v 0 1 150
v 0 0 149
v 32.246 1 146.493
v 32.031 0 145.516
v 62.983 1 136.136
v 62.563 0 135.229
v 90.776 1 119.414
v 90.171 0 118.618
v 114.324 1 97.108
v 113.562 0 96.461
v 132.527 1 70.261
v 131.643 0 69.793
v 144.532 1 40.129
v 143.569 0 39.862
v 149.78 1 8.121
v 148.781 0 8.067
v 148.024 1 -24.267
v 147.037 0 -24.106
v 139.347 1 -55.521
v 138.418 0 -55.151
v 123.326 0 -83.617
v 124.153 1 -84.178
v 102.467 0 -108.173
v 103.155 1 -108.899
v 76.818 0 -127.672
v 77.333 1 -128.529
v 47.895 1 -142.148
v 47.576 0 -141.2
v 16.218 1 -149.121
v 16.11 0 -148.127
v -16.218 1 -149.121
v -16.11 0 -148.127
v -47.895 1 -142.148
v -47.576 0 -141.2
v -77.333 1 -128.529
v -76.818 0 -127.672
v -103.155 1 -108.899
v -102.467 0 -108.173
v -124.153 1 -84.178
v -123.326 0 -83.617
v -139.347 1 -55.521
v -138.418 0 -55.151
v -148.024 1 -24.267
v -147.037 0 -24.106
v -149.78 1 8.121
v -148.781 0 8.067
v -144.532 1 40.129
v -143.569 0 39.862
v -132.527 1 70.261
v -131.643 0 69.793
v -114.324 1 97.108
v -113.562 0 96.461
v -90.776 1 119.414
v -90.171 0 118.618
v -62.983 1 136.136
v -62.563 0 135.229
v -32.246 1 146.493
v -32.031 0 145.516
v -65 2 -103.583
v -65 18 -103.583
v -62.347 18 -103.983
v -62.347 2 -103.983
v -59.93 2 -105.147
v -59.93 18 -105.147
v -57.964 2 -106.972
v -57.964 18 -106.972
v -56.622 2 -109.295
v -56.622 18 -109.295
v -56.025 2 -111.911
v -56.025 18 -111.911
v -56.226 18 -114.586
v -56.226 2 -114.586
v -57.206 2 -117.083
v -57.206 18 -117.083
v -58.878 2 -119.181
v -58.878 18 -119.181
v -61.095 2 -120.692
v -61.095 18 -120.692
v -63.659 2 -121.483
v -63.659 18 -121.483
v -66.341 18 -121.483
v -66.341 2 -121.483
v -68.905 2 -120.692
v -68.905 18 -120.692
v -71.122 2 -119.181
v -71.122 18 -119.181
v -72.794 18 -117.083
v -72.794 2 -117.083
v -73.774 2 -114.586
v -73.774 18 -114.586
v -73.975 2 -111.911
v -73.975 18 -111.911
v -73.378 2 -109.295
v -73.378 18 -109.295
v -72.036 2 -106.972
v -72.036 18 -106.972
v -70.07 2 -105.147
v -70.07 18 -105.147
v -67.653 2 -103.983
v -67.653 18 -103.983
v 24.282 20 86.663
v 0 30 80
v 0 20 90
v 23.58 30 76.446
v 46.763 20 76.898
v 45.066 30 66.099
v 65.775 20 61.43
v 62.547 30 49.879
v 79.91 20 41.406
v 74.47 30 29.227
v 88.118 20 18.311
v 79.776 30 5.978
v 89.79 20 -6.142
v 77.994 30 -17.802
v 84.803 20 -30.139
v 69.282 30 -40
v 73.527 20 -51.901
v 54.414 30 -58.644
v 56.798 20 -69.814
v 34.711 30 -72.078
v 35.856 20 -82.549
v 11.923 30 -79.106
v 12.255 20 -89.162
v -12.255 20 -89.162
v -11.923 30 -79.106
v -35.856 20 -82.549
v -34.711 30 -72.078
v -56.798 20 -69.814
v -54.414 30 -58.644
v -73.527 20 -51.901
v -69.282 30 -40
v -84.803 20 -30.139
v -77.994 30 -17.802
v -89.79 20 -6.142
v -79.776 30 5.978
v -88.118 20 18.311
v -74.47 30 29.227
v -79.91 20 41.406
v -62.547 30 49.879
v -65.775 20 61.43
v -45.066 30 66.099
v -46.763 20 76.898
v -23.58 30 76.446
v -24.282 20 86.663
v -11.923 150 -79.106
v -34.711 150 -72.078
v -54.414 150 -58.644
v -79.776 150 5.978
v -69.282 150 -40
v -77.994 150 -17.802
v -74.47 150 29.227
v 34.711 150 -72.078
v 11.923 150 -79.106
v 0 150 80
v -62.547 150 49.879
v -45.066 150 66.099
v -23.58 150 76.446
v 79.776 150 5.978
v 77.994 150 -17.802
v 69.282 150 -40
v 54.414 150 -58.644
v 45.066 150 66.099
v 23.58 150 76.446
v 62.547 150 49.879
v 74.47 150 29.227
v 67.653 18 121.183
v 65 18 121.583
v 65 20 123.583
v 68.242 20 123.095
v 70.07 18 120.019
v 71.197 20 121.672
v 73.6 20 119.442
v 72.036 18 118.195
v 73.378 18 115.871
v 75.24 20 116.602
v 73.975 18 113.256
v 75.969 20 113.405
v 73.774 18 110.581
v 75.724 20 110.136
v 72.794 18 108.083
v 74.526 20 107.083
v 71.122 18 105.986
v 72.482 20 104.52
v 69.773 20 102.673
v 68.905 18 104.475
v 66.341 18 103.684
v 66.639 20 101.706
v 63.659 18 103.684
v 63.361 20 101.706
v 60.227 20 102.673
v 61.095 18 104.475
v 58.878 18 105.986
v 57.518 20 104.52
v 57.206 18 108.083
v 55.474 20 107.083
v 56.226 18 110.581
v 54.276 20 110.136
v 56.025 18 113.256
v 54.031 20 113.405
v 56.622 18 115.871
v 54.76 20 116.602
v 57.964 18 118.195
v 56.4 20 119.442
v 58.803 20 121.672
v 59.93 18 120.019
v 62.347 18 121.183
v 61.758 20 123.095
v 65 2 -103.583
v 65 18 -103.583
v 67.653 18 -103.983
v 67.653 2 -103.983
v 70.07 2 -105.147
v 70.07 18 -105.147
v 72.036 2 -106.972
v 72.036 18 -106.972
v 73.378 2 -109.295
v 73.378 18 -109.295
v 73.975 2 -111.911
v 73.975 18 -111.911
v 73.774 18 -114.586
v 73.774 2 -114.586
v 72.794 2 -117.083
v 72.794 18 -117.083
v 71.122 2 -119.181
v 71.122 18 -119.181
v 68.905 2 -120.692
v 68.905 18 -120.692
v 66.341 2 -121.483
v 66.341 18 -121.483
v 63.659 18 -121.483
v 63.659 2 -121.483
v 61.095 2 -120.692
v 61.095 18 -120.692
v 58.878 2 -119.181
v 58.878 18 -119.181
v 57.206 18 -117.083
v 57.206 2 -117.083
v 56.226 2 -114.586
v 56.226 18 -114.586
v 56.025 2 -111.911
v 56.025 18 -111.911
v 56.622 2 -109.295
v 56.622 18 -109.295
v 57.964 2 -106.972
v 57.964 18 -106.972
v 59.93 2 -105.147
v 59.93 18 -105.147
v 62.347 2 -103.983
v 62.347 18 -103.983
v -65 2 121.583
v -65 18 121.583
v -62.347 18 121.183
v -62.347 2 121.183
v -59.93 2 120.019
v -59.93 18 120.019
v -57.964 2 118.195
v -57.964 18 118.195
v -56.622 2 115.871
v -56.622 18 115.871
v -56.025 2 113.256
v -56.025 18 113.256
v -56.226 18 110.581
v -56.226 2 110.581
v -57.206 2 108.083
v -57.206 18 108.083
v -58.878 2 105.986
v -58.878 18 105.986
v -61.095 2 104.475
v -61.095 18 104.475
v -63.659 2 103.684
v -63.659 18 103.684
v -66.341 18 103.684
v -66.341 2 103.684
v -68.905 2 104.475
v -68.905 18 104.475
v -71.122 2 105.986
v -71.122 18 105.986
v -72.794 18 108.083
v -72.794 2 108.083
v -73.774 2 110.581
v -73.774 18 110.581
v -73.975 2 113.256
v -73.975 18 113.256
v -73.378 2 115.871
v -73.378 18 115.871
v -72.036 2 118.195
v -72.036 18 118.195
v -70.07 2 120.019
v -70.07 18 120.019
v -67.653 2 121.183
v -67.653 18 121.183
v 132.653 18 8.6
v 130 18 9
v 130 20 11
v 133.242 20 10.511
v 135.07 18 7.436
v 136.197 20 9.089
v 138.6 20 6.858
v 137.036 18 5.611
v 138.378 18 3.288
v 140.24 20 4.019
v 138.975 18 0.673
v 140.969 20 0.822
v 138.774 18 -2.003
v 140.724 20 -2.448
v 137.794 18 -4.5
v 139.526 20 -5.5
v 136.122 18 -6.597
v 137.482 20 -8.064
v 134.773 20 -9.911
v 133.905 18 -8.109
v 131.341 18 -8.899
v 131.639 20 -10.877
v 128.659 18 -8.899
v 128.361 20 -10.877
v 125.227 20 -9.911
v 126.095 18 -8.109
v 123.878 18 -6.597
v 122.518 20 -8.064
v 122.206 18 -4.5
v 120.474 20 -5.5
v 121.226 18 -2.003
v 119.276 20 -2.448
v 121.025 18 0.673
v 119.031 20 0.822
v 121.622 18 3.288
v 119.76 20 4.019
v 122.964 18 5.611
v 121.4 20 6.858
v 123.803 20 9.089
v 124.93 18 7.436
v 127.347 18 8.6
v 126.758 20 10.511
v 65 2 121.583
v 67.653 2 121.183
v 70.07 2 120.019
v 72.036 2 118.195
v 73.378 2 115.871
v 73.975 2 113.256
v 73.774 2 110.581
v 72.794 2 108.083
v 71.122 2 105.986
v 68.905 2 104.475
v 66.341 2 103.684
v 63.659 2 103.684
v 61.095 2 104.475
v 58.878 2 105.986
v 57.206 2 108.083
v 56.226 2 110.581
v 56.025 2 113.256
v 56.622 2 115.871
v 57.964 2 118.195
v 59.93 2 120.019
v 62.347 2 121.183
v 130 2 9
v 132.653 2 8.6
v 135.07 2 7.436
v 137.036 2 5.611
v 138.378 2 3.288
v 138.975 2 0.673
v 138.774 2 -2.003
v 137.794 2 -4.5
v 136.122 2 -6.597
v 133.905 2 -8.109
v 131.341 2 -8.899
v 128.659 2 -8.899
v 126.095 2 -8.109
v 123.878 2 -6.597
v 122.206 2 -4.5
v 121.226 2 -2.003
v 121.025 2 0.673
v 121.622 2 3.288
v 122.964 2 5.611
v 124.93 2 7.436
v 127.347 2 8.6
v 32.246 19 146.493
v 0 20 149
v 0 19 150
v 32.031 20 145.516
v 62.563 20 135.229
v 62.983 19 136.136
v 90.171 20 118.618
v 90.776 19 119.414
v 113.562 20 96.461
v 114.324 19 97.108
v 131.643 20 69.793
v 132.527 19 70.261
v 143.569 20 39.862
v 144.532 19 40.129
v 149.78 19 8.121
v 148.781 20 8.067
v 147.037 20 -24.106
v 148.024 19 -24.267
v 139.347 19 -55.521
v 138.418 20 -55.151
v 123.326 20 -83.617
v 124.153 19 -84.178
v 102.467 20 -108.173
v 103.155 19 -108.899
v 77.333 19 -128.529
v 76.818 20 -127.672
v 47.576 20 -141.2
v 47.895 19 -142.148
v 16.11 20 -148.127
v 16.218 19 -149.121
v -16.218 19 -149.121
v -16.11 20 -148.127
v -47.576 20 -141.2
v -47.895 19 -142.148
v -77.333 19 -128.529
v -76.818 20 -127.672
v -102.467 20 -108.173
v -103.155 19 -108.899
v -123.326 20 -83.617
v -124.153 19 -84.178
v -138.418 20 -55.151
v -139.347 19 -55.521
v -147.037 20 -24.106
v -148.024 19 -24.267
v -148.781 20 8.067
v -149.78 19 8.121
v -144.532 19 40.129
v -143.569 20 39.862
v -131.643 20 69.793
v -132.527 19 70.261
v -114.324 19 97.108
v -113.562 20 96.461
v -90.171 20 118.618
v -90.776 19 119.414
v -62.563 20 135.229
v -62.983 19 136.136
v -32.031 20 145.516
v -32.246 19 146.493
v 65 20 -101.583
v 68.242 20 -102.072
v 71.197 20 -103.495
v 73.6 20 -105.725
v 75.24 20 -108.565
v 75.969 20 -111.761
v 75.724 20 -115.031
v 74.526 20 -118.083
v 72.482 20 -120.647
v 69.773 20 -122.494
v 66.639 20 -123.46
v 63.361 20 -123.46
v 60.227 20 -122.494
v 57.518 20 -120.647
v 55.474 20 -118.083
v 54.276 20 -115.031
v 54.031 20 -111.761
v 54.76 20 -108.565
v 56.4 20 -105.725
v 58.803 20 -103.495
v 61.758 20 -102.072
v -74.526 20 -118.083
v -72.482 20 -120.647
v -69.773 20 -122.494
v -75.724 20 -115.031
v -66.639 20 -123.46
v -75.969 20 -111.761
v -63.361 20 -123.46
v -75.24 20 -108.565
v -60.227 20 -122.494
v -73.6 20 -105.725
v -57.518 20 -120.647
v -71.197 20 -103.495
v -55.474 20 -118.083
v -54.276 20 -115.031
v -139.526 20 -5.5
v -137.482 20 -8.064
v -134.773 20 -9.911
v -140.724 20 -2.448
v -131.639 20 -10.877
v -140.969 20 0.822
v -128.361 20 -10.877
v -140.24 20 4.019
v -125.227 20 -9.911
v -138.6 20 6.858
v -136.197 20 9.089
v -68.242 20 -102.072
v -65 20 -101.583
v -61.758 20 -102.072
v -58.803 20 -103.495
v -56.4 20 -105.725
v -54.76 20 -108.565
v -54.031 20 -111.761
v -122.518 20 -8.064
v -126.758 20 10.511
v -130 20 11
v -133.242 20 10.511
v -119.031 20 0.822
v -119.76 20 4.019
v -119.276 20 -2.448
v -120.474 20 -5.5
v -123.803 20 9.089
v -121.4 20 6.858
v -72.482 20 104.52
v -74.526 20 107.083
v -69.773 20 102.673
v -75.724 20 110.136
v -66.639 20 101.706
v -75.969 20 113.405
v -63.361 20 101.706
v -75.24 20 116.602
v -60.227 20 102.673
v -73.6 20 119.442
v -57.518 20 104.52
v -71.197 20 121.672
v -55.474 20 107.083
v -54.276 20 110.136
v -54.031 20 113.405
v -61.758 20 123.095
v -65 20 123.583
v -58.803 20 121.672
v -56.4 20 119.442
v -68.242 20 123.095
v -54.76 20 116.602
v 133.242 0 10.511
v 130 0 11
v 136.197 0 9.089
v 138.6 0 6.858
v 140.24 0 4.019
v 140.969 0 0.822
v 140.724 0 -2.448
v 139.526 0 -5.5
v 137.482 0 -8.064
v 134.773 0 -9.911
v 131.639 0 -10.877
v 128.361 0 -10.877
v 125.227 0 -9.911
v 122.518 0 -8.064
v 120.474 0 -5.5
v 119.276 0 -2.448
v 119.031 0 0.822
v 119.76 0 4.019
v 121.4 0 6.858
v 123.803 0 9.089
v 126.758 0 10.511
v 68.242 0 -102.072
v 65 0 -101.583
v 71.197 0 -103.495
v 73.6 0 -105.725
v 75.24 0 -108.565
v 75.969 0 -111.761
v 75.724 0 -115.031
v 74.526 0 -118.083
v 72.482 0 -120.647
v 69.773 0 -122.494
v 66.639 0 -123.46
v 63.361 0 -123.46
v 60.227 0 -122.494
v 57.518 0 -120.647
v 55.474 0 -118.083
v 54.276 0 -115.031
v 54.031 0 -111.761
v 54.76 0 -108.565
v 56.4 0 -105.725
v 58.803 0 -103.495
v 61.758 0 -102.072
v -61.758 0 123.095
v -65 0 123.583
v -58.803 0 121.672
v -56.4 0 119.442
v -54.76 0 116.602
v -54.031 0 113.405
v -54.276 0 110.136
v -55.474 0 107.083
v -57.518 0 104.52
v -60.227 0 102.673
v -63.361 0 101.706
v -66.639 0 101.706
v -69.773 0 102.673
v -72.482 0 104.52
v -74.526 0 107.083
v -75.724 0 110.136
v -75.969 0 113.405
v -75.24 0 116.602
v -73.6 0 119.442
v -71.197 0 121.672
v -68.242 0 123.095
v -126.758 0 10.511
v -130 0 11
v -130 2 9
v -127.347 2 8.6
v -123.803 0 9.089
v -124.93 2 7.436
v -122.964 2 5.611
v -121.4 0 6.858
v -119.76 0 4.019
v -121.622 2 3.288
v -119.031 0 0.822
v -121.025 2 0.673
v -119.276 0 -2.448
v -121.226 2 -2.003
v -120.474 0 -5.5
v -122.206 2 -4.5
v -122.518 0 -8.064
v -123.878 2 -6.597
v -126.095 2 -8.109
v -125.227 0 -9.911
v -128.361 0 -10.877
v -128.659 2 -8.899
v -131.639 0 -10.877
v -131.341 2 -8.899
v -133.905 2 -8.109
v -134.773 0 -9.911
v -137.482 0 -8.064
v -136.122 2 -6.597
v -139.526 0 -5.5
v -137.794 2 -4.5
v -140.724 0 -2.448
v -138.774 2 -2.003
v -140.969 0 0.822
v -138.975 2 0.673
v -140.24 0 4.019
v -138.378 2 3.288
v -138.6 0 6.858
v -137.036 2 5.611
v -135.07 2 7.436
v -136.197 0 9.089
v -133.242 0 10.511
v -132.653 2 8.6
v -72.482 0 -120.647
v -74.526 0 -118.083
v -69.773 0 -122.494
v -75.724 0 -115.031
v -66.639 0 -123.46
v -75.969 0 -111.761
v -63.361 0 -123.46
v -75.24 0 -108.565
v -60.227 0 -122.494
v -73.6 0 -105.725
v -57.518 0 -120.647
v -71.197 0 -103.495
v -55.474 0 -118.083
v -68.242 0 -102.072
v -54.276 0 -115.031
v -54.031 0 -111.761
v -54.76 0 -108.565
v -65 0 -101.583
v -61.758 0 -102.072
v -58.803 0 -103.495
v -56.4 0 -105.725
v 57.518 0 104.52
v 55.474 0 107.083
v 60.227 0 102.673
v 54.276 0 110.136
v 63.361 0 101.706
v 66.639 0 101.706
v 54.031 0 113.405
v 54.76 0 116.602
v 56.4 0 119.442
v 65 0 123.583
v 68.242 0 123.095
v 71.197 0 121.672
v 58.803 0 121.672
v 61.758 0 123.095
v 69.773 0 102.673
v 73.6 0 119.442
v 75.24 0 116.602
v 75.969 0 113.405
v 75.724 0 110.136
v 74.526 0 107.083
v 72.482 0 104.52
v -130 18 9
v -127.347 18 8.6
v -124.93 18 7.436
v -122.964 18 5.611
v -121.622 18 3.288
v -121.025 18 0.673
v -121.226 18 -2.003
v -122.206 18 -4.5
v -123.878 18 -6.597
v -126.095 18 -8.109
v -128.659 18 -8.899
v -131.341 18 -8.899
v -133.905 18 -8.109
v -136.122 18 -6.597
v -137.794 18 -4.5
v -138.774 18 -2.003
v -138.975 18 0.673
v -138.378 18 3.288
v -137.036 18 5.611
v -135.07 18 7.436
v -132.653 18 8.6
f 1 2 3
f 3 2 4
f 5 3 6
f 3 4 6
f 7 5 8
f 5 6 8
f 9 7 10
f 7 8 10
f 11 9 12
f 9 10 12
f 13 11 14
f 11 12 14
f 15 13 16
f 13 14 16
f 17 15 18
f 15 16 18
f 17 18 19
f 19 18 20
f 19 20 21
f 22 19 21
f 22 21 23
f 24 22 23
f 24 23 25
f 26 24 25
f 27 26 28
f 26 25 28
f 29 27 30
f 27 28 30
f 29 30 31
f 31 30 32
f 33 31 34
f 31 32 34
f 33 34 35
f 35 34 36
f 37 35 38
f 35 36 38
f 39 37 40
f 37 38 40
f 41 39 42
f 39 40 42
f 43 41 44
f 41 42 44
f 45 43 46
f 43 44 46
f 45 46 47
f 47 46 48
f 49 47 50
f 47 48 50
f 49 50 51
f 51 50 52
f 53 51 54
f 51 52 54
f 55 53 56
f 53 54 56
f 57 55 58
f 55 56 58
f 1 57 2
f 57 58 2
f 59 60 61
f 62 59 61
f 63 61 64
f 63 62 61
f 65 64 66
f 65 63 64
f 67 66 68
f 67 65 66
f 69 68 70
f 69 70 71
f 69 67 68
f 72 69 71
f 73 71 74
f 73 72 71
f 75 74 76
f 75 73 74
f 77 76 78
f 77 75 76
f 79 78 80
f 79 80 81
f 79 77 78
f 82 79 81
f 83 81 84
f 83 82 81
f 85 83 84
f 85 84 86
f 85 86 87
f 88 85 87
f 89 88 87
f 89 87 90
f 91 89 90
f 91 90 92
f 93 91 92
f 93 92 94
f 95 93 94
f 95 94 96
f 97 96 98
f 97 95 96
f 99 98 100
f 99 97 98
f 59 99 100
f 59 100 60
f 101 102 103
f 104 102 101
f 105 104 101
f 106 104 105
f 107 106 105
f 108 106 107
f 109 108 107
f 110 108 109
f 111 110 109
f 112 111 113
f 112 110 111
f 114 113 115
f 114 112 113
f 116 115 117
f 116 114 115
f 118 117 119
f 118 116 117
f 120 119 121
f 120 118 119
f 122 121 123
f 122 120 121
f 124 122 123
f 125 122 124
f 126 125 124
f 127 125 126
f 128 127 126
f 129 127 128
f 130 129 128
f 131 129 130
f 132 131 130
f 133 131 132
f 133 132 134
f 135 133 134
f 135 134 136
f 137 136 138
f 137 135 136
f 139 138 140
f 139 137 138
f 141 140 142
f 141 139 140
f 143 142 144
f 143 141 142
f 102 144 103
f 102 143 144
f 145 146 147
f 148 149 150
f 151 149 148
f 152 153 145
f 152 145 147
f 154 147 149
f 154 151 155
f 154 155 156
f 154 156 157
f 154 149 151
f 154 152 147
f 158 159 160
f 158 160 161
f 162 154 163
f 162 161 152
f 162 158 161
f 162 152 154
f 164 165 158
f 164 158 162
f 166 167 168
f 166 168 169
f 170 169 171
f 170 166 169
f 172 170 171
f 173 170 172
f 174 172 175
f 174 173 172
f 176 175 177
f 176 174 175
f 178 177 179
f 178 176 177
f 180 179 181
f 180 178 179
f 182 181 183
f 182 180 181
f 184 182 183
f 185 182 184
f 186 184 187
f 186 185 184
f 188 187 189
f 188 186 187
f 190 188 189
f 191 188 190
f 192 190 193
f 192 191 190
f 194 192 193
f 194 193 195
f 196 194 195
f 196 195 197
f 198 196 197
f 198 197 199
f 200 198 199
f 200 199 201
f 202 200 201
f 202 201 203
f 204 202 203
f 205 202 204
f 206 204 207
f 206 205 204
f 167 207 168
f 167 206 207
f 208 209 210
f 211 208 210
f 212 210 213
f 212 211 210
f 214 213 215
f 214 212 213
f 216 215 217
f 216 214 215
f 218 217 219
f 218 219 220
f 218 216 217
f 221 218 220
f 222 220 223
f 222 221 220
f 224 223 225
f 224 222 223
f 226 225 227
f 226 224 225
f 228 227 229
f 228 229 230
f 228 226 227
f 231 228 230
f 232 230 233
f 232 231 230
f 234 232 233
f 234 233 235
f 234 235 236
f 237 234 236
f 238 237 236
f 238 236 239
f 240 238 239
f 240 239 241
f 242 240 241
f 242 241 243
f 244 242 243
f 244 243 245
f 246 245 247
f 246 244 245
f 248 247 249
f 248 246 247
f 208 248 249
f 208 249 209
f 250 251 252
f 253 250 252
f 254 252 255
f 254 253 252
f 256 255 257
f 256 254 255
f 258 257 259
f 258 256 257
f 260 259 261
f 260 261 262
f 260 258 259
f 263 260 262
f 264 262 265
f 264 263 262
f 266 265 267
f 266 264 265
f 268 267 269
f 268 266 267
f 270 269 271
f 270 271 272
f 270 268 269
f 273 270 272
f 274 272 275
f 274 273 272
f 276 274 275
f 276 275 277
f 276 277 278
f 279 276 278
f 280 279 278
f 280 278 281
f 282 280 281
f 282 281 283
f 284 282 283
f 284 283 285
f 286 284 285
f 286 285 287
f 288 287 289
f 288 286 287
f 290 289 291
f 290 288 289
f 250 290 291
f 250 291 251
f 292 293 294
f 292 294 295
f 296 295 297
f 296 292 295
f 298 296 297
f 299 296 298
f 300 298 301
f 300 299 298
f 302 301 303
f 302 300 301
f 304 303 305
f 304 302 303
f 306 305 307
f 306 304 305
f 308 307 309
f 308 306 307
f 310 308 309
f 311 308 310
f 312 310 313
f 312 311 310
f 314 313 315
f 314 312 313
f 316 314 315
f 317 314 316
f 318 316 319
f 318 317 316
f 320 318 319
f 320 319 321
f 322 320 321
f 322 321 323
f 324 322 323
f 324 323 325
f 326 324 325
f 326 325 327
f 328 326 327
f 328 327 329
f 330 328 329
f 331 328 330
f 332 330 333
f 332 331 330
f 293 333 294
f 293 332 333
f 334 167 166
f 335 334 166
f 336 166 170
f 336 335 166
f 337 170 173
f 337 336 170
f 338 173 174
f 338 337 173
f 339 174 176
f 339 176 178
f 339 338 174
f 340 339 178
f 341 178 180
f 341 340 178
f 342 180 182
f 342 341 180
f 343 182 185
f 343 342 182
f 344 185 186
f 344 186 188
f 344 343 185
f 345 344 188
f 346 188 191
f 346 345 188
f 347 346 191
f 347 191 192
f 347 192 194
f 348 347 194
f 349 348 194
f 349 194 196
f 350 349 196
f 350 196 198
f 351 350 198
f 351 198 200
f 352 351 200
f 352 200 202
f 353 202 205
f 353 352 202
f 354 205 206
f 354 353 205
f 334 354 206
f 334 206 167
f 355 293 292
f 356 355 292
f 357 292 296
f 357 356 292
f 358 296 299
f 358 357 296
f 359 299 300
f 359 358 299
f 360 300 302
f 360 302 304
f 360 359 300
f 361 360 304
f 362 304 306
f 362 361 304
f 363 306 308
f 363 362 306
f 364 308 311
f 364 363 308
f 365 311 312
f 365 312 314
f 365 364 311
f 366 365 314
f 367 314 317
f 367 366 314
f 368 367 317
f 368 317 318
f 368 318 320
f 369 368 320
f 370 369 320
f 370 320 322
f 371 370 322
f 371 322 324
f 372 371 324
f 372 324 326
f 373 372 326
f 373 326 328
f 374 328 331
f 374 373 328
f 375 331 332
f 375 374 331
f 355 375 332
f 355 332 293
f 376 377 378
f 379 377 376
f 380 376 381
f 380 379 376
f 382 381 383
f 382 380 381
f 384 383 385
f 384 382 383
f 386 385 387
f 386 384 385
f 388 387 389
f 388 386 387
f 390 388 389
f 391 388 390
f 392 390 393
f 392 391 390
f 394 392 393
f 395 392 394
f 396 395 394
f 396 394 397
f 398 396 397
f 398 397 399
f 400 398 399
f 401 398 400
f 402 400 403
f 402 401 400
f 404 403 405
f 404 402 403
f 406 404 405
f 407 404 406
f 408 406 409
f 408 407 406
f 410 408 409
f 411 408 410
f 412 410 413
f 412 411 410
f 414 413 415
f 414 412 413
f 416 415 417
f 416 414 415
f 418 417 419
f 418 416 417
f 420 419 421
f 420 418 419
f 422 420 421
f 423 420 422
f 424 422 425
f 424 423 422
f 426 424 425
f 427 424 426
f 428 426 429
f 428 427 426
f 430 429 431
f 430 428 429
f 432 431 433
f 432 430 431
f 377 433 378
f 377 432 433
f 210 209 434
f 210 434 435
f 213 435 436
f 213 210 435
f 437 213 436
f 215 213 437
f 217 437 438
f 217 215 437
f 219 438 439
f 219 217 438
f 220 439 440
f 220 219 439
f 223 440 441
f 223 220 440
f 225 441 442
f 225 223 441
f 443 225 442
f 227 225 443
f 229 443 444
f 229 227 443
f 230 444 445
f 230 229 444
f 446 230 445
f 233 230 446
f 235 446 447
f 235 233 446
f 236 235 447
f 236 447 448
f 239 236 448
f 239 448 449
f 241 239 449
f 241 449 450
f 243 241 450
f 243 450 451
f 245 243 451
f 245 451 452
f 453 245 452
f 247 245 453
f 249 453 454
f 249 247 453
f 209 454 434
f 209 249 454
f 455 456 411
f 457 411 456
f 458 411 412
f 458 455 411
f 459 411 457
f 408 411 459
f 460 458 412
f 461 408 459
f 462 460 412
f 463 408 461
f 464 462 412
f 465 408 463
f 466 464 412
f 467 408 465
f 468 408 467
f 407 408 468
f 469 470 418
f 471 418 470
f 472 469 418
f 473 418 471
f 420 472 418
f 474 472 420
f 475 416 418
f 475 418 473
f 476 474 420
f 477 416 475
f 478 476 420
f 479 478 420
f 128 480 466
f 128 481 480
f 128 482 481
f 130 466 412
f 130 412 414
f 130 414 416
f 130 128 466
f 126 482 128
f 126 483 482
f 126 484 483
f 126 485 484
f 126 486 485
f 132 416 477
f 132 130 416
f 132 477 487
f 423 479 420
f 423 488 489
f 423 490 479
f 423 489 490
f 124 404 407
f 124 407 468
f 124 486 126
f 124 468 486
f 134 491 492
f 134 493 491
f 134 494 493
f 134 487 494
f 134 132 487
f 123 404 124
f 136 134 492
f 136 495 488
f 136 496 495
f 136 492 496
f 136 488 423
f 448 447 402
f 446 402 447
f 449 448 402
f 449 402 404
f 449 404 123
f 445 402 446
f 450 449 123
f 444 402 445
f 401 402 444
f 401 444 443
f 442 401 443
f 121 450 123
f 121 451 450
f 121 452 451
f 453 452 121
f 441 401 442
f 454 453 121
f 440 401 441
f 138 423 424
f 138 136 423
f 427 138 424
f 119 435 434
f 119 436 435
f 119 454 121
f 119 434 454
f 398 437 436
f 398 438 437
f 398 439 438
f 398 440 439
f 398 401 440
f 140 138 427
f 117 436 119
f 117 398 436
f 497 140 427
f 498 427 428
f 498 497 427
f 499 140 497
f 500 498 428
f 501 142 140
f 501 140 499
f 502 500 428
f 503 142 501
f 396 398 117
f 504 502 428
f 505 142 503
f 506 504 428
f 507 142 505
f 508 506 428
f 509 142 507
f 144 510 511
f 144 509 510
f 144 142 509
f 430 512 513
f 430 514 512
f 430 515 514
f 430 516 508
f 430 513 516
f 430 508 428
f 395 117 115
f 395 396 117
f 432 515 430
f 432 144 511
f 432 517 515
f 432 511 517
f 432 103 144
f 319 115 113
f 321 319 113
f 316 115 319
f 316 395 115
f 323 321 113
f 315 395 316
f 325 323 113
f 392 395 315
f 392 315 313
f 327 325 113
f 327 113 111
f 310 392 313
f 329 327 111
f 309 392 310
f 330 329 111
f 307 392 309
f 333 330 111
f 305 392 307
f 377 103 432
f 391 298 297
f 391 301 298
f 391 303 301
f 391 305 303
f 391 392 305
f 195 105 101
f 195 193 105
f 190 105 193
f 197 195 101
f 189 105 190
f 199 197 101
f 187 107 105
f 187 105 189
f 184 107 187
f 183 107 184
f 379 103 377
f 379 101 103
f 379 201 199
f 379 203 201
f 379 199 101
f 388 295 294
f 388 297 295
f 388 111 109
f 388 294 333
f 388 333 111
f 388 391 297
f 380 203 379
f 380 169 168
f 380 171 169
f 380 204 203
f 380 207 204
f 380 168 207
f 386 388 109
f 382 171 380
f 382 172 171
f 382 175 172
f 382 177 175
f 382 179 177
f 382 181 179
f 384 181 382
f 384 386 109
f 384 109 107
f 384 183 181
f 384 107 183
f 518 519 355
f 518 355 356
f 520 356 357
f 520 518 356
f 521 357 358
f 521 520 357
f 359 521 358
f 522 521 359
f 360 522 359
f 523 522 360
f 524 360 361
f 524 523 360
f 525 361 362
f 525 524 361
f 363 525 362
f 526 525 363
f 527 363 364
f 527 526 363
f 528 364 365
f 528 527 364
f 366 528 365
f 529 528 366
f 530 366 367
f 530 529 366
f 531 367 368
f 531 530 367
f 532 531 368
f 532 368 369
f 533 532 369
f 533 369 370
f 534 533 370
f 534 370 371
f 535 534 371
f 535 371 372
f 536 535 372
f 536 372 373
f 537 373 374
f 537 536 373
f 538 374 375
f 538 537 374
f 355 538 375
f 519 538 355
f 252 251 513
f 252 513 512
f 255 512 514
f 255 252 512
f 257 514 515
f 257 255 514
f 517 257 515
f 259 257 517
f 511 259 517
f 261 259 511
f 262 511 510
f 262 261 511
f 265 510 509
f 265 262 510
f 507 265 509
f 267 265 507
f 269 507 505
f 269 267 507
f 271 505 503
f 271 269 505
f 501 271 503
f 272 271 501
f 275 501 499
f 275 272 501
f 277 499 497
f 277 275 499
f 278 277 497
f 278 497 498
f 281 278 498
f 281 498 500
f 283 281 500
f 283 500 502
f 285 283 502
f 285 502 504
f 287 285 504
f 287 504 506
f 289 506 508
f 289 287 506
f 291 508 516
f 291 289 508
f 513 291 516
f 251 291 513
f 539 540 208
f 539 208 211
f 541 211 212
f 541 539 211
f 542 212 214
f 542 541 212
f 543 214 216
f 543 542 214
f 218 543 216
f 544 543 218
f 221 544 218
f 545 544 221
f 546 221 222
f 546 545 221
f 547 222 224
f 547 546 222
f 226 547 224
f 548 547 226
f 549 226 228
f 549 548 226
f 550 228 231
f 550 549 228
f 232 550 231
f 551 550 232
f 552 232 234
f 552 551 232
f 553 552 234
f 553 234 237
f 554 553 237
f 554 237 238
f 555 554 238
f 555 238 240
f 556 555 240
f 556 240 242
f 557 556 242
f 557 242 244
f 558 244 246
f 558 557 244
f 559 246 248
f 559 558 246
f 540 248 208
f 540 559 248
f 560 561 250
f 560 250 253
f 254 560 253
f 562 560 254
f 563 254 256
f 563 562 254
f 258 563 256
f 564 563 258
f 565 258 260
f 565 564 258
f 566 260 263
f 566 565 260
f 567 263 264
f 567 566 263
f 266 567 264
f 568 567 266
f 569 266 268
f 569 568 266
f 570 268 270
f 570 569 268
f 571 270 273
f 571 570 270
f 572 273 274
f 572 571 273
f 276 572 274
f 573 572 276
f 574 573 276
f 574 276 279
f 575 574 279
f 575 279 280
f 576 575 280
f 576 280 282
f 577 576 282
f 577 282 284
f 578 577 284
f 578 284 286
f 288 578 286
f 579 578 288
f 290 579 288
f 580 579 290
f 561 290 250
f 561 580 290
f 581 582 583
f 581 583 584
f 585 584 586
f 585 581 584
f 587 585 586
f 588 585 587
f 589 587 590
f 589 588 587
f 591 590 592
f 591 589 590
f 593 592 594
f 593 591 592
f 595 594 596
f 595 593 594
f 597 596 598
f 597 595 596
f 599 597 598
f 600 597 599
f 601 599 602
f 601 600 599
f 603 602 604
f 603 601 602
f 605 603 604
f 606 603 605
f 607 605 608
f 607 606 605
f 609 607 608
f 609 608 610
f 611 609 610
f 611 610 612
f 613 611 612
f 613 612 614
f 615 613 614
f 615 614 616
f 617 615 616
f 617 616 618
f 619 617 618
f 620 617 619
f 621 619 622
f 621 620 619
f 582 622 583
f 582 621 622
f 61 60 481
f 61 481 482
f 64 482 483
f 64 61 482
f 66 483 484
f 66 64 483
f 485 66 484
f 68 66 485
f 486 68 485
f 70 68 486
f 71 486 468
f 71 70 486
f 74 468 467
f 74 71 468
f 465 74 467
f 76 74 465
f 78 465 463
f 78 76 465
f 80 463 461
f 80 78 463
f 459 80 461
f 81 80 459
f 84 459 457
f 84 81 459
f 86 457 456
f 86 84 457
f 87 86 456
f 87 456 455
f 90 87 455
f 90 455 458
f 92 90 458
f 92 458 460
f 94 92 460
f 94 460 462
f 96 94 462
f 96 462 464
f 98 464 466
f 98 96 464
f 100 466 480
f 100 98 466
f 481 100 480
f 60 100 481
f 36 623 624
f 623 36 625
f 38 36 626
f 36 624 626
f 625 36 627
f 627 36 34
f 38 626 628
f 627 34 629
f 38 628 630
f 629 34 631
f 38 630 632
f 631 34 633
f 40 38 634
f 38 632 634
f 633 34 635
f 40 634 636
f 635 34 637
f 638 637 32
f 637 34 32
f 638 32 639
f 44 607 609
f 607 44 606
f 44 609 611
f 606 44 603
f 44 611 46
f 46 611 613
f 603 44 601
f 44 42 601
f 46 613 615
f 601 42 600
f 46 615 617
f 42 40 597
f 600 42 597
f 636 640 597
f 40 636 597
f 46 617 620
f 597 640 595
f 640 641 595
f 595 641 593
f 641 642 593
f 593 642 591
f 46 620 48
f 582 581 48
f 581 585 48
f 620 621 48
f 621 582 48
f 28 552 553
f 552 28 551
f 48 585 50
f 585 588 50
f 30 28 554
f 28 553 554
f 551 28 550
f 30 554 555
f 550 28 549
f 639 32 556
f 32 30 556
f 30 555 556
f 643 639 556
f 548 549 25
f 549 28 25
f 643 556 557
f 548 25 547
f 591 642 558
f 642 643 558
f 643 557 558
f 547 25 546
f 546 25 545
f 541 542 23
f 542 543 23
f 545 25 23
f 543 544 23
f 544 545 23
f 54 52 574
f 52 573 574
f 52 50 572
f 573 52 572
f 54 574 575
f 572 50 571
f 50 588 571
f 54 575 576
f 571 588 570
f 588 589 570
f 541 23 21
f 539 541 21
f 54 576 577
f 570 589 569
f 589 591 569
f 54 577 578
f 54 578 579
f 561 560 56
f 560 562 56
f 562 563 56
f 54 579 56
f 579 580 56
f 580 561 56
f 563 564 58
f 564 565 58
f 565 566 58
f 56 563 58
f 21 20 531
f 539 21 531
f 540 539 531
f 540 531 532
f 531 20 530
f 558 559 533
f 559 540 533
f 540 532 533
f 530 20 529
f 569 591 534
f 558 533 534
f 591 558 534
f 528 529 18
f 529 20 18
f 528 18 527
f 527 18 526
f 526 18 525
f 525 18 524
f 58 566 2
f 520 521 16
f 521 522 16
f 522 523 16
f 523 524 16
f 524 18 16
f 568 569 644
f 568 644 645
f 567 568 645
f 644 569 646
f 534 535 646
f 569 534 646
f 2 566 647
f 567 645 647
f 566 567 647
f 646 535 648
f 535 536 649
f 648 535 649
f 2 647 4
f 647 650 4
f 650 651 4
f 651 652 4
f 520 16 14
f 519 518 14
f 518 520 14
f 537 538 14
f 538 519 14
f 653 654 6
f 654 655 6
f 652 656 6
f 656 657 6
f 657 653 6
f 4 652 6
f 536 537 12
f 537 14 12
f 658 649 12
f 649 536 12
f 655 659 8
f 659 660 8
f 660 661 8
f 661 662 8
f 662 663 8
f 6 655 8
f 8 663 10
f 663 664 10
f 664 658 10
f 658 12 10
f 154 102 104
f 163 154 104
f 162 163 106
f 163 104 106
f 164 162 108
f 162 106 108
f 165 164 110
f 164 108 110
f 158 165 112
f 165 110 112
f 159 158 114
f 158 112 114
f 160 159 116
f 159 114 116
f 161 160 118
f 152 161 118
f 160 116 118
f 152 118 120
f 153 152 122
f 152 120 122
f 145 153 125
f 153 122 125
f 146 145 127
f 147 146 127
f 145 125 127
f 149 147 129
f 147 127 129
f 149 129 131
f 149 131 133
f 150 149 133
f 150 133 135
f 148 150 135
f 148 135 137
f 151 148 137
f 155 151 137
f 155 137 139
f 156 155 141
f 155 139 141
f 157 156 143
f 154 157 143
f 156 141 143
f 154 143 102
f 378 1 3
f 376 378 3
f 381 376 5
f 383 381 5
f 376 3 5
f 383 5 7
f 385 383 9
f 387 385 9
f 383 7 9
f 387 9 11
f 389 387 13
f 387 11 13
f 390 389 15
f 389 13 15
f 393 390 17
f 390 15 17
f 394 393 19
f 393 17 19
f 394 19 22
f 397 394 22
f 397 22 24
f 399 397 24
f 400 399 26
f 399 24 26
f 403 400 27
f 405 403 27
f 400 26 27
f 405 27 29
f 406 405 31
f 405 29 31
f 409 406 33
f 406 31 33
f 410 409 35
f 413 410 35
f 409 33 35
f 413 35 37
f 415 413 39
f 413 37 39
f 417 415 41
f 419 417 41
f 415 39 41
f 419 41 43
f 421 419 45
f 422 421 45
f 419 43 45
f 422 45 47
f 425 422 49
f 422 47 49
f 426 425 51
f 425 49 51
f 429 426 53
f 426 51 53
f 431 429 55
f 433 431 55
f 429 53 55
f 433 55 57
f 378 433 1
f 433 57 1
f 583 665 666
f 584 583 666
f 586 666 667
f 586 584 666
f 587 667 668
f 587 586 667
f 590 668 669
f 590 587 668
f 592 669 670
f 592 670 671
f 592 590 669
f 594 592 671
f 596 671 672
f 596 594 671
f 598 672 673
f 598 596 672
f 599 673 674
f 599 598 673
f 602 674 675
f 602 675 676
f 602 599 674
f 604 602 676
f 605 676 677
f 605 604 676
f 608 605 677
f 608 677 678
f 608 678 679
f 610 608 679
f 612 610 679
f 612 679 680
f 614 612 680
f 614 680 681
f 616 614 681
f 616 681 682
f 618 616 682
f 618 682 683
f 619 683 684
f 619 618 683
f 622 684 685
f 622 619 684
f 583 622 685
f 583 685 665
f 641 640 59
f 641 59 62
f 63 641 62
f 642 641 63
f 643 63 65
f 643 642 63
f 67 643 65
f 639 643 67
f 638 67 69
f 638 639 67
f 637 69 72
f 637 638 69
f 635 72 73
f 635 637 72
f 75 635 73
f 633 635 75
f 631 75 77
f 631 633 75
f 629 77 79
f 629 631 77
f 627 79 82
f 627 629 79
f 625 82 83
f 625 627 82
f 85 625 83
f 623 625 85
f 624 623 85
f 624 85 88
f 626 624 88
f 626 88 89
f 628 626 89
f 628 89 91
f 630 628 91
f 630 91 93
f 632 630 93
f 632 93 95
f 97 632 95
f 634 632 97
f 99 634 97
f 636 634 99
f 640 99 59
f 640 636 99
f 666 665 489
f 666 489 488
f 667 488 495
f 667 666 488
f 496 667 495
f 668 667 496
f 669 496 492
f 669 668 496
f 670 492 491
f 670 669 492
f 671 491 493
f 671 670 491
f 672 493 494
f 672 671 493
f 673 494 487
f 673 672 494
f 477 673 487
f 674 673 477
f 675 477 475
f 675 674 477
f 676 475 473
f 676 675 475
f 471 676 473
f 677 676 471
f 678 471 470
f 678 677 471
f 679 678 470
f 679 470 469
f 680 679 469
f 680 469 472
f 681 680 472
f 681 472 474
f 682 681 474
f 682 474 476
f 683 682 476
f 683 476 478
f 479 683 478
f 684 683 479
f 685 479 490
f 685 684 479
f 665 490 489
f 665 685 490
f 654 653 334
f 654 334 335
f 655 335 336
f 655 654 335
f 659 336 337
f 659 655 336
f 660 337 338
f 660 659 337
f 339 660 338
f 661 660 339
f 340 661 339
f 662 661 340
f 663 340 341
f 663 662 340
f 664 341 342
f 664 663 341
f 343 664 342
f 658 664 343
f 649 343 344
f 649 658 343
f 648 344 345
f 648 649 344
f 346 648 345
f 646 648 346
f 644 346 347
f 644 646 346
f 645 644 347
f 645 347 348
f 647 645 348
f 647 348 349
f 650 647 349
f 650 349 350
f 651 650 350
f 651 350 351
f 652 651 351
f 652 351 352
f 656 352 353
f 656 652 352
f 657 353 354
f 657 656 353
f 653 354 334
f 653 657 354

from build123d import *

# Parameters (mm, degrees)
SKIZZE1_R                       = 150
SKIZZE1_R_2                     = 9
AUFSATZ_LINEAR_AUSTRAGEN1_DEPTH = 20
SKIZZE3_R                       = 80
AUFSATZ_LINEAR_AUSTRAGEN2_DEPTH = 130
FASE1_SIZE                      = 1
FASE2_SIZE                      = 10
FASE3_SIZE                      = 2


with BuildPart() as part:
    # Skizze1 → Aufsatz-Linear austragen1 (new body)
    with BuildSketch(Plane(origin=(0, 0, 0), x_dir=(1, 0, 0), z_dir=(0, 1, 0))):
        with Locations(Location((0, 0, 0), (0, 0, 270))):
            Circle(SKIZZE1_R)
        with Locations(Location((130, 0, 0), (0, 0, 270))):
            Circle(SKIZZE1_R_2, mode=Mode.SUBTRACT)
        with Locations(Location((65, -112.583302492, 0), (0, 0, 270))):
            Circle(SKIZZE1_R_2, mode=Mode.SUBTRACT)
        with Locations(Location((-65, -112.583302492, 0), (0, 0, 270))):
            Circle(SKIZZE1_R_2, mode=Mode.SUBTRACT)
        with Locations(Location((-130, 0, 0), (0, 0, 270))):
            Circle(SKIZZE1_R_2, mode=Mode.SUBTRACT)
        with Locations(Location((-65, 112.583302492, 0), (0, 0, 270))):
            Circle(SKIZZE1_R_2, mode=Mode.SUBTRACT)
        with Locations(Location((65, 112.583302492, 0), (0, 0, 270))):
            Circle(SKIZZE1_R_2, mode=Mode.SUBTRACT)
    extrude(amount=AUFSATZ_LINEAR_AUSTRAGEN1_DEPTH)

    # Skizze3 → Aufsatz-Linear austragen2 (add)
    with BuildSketch(Plane(origin=(0, 20, 0), x_dir=(1, 0, 0), z_dir=(0, 1, 0))):
        with Locations(Location((0, 0, 0), (0, 0, 270))):
            Circle(SKIZZE3_R)
    extrude(amount=AUFSATZ_LINEAR_AUSTRAGEN2_DEPTH)

    # Fase1
    fase1_edges = [part.edges().sort_by_distance(p)[0] for p in [
        (0, 0, -150),
        (0, 20, -150),
    ]]
    chamfer(fase1_edges, length=FASE1_SIZE)

    # Fase2
    fase2_edges = [part.edges().sort_by_distance(p)[0] for p in [
        (0, 20, -80),
    ]]
    chamfer(fase2_edges, length=FASE2_SIZE)

    # Fase3
    fase3_edges = [part.edges().sort_by_distance(p)[0] for p in [
        (-65, 0, 103.583302492),
        (-65, 20, 103.583302492),
        (-130, 0, -9),
        (-130, 20, -9),
        (-65, 0, -121.583302492),
        (-65, 20, -121.583302492),
        (65, 0, -121.583302492),
        (65, 20, -121.583302492),
        (130, 0, -9),
        (130, 20, -9),
        (65, 0, 103.583302492),
        (65, 20, 103.583302492),
    ]]
    chamfer(fase3_edges, length=FASE3_SIZE)


solid = part.part
